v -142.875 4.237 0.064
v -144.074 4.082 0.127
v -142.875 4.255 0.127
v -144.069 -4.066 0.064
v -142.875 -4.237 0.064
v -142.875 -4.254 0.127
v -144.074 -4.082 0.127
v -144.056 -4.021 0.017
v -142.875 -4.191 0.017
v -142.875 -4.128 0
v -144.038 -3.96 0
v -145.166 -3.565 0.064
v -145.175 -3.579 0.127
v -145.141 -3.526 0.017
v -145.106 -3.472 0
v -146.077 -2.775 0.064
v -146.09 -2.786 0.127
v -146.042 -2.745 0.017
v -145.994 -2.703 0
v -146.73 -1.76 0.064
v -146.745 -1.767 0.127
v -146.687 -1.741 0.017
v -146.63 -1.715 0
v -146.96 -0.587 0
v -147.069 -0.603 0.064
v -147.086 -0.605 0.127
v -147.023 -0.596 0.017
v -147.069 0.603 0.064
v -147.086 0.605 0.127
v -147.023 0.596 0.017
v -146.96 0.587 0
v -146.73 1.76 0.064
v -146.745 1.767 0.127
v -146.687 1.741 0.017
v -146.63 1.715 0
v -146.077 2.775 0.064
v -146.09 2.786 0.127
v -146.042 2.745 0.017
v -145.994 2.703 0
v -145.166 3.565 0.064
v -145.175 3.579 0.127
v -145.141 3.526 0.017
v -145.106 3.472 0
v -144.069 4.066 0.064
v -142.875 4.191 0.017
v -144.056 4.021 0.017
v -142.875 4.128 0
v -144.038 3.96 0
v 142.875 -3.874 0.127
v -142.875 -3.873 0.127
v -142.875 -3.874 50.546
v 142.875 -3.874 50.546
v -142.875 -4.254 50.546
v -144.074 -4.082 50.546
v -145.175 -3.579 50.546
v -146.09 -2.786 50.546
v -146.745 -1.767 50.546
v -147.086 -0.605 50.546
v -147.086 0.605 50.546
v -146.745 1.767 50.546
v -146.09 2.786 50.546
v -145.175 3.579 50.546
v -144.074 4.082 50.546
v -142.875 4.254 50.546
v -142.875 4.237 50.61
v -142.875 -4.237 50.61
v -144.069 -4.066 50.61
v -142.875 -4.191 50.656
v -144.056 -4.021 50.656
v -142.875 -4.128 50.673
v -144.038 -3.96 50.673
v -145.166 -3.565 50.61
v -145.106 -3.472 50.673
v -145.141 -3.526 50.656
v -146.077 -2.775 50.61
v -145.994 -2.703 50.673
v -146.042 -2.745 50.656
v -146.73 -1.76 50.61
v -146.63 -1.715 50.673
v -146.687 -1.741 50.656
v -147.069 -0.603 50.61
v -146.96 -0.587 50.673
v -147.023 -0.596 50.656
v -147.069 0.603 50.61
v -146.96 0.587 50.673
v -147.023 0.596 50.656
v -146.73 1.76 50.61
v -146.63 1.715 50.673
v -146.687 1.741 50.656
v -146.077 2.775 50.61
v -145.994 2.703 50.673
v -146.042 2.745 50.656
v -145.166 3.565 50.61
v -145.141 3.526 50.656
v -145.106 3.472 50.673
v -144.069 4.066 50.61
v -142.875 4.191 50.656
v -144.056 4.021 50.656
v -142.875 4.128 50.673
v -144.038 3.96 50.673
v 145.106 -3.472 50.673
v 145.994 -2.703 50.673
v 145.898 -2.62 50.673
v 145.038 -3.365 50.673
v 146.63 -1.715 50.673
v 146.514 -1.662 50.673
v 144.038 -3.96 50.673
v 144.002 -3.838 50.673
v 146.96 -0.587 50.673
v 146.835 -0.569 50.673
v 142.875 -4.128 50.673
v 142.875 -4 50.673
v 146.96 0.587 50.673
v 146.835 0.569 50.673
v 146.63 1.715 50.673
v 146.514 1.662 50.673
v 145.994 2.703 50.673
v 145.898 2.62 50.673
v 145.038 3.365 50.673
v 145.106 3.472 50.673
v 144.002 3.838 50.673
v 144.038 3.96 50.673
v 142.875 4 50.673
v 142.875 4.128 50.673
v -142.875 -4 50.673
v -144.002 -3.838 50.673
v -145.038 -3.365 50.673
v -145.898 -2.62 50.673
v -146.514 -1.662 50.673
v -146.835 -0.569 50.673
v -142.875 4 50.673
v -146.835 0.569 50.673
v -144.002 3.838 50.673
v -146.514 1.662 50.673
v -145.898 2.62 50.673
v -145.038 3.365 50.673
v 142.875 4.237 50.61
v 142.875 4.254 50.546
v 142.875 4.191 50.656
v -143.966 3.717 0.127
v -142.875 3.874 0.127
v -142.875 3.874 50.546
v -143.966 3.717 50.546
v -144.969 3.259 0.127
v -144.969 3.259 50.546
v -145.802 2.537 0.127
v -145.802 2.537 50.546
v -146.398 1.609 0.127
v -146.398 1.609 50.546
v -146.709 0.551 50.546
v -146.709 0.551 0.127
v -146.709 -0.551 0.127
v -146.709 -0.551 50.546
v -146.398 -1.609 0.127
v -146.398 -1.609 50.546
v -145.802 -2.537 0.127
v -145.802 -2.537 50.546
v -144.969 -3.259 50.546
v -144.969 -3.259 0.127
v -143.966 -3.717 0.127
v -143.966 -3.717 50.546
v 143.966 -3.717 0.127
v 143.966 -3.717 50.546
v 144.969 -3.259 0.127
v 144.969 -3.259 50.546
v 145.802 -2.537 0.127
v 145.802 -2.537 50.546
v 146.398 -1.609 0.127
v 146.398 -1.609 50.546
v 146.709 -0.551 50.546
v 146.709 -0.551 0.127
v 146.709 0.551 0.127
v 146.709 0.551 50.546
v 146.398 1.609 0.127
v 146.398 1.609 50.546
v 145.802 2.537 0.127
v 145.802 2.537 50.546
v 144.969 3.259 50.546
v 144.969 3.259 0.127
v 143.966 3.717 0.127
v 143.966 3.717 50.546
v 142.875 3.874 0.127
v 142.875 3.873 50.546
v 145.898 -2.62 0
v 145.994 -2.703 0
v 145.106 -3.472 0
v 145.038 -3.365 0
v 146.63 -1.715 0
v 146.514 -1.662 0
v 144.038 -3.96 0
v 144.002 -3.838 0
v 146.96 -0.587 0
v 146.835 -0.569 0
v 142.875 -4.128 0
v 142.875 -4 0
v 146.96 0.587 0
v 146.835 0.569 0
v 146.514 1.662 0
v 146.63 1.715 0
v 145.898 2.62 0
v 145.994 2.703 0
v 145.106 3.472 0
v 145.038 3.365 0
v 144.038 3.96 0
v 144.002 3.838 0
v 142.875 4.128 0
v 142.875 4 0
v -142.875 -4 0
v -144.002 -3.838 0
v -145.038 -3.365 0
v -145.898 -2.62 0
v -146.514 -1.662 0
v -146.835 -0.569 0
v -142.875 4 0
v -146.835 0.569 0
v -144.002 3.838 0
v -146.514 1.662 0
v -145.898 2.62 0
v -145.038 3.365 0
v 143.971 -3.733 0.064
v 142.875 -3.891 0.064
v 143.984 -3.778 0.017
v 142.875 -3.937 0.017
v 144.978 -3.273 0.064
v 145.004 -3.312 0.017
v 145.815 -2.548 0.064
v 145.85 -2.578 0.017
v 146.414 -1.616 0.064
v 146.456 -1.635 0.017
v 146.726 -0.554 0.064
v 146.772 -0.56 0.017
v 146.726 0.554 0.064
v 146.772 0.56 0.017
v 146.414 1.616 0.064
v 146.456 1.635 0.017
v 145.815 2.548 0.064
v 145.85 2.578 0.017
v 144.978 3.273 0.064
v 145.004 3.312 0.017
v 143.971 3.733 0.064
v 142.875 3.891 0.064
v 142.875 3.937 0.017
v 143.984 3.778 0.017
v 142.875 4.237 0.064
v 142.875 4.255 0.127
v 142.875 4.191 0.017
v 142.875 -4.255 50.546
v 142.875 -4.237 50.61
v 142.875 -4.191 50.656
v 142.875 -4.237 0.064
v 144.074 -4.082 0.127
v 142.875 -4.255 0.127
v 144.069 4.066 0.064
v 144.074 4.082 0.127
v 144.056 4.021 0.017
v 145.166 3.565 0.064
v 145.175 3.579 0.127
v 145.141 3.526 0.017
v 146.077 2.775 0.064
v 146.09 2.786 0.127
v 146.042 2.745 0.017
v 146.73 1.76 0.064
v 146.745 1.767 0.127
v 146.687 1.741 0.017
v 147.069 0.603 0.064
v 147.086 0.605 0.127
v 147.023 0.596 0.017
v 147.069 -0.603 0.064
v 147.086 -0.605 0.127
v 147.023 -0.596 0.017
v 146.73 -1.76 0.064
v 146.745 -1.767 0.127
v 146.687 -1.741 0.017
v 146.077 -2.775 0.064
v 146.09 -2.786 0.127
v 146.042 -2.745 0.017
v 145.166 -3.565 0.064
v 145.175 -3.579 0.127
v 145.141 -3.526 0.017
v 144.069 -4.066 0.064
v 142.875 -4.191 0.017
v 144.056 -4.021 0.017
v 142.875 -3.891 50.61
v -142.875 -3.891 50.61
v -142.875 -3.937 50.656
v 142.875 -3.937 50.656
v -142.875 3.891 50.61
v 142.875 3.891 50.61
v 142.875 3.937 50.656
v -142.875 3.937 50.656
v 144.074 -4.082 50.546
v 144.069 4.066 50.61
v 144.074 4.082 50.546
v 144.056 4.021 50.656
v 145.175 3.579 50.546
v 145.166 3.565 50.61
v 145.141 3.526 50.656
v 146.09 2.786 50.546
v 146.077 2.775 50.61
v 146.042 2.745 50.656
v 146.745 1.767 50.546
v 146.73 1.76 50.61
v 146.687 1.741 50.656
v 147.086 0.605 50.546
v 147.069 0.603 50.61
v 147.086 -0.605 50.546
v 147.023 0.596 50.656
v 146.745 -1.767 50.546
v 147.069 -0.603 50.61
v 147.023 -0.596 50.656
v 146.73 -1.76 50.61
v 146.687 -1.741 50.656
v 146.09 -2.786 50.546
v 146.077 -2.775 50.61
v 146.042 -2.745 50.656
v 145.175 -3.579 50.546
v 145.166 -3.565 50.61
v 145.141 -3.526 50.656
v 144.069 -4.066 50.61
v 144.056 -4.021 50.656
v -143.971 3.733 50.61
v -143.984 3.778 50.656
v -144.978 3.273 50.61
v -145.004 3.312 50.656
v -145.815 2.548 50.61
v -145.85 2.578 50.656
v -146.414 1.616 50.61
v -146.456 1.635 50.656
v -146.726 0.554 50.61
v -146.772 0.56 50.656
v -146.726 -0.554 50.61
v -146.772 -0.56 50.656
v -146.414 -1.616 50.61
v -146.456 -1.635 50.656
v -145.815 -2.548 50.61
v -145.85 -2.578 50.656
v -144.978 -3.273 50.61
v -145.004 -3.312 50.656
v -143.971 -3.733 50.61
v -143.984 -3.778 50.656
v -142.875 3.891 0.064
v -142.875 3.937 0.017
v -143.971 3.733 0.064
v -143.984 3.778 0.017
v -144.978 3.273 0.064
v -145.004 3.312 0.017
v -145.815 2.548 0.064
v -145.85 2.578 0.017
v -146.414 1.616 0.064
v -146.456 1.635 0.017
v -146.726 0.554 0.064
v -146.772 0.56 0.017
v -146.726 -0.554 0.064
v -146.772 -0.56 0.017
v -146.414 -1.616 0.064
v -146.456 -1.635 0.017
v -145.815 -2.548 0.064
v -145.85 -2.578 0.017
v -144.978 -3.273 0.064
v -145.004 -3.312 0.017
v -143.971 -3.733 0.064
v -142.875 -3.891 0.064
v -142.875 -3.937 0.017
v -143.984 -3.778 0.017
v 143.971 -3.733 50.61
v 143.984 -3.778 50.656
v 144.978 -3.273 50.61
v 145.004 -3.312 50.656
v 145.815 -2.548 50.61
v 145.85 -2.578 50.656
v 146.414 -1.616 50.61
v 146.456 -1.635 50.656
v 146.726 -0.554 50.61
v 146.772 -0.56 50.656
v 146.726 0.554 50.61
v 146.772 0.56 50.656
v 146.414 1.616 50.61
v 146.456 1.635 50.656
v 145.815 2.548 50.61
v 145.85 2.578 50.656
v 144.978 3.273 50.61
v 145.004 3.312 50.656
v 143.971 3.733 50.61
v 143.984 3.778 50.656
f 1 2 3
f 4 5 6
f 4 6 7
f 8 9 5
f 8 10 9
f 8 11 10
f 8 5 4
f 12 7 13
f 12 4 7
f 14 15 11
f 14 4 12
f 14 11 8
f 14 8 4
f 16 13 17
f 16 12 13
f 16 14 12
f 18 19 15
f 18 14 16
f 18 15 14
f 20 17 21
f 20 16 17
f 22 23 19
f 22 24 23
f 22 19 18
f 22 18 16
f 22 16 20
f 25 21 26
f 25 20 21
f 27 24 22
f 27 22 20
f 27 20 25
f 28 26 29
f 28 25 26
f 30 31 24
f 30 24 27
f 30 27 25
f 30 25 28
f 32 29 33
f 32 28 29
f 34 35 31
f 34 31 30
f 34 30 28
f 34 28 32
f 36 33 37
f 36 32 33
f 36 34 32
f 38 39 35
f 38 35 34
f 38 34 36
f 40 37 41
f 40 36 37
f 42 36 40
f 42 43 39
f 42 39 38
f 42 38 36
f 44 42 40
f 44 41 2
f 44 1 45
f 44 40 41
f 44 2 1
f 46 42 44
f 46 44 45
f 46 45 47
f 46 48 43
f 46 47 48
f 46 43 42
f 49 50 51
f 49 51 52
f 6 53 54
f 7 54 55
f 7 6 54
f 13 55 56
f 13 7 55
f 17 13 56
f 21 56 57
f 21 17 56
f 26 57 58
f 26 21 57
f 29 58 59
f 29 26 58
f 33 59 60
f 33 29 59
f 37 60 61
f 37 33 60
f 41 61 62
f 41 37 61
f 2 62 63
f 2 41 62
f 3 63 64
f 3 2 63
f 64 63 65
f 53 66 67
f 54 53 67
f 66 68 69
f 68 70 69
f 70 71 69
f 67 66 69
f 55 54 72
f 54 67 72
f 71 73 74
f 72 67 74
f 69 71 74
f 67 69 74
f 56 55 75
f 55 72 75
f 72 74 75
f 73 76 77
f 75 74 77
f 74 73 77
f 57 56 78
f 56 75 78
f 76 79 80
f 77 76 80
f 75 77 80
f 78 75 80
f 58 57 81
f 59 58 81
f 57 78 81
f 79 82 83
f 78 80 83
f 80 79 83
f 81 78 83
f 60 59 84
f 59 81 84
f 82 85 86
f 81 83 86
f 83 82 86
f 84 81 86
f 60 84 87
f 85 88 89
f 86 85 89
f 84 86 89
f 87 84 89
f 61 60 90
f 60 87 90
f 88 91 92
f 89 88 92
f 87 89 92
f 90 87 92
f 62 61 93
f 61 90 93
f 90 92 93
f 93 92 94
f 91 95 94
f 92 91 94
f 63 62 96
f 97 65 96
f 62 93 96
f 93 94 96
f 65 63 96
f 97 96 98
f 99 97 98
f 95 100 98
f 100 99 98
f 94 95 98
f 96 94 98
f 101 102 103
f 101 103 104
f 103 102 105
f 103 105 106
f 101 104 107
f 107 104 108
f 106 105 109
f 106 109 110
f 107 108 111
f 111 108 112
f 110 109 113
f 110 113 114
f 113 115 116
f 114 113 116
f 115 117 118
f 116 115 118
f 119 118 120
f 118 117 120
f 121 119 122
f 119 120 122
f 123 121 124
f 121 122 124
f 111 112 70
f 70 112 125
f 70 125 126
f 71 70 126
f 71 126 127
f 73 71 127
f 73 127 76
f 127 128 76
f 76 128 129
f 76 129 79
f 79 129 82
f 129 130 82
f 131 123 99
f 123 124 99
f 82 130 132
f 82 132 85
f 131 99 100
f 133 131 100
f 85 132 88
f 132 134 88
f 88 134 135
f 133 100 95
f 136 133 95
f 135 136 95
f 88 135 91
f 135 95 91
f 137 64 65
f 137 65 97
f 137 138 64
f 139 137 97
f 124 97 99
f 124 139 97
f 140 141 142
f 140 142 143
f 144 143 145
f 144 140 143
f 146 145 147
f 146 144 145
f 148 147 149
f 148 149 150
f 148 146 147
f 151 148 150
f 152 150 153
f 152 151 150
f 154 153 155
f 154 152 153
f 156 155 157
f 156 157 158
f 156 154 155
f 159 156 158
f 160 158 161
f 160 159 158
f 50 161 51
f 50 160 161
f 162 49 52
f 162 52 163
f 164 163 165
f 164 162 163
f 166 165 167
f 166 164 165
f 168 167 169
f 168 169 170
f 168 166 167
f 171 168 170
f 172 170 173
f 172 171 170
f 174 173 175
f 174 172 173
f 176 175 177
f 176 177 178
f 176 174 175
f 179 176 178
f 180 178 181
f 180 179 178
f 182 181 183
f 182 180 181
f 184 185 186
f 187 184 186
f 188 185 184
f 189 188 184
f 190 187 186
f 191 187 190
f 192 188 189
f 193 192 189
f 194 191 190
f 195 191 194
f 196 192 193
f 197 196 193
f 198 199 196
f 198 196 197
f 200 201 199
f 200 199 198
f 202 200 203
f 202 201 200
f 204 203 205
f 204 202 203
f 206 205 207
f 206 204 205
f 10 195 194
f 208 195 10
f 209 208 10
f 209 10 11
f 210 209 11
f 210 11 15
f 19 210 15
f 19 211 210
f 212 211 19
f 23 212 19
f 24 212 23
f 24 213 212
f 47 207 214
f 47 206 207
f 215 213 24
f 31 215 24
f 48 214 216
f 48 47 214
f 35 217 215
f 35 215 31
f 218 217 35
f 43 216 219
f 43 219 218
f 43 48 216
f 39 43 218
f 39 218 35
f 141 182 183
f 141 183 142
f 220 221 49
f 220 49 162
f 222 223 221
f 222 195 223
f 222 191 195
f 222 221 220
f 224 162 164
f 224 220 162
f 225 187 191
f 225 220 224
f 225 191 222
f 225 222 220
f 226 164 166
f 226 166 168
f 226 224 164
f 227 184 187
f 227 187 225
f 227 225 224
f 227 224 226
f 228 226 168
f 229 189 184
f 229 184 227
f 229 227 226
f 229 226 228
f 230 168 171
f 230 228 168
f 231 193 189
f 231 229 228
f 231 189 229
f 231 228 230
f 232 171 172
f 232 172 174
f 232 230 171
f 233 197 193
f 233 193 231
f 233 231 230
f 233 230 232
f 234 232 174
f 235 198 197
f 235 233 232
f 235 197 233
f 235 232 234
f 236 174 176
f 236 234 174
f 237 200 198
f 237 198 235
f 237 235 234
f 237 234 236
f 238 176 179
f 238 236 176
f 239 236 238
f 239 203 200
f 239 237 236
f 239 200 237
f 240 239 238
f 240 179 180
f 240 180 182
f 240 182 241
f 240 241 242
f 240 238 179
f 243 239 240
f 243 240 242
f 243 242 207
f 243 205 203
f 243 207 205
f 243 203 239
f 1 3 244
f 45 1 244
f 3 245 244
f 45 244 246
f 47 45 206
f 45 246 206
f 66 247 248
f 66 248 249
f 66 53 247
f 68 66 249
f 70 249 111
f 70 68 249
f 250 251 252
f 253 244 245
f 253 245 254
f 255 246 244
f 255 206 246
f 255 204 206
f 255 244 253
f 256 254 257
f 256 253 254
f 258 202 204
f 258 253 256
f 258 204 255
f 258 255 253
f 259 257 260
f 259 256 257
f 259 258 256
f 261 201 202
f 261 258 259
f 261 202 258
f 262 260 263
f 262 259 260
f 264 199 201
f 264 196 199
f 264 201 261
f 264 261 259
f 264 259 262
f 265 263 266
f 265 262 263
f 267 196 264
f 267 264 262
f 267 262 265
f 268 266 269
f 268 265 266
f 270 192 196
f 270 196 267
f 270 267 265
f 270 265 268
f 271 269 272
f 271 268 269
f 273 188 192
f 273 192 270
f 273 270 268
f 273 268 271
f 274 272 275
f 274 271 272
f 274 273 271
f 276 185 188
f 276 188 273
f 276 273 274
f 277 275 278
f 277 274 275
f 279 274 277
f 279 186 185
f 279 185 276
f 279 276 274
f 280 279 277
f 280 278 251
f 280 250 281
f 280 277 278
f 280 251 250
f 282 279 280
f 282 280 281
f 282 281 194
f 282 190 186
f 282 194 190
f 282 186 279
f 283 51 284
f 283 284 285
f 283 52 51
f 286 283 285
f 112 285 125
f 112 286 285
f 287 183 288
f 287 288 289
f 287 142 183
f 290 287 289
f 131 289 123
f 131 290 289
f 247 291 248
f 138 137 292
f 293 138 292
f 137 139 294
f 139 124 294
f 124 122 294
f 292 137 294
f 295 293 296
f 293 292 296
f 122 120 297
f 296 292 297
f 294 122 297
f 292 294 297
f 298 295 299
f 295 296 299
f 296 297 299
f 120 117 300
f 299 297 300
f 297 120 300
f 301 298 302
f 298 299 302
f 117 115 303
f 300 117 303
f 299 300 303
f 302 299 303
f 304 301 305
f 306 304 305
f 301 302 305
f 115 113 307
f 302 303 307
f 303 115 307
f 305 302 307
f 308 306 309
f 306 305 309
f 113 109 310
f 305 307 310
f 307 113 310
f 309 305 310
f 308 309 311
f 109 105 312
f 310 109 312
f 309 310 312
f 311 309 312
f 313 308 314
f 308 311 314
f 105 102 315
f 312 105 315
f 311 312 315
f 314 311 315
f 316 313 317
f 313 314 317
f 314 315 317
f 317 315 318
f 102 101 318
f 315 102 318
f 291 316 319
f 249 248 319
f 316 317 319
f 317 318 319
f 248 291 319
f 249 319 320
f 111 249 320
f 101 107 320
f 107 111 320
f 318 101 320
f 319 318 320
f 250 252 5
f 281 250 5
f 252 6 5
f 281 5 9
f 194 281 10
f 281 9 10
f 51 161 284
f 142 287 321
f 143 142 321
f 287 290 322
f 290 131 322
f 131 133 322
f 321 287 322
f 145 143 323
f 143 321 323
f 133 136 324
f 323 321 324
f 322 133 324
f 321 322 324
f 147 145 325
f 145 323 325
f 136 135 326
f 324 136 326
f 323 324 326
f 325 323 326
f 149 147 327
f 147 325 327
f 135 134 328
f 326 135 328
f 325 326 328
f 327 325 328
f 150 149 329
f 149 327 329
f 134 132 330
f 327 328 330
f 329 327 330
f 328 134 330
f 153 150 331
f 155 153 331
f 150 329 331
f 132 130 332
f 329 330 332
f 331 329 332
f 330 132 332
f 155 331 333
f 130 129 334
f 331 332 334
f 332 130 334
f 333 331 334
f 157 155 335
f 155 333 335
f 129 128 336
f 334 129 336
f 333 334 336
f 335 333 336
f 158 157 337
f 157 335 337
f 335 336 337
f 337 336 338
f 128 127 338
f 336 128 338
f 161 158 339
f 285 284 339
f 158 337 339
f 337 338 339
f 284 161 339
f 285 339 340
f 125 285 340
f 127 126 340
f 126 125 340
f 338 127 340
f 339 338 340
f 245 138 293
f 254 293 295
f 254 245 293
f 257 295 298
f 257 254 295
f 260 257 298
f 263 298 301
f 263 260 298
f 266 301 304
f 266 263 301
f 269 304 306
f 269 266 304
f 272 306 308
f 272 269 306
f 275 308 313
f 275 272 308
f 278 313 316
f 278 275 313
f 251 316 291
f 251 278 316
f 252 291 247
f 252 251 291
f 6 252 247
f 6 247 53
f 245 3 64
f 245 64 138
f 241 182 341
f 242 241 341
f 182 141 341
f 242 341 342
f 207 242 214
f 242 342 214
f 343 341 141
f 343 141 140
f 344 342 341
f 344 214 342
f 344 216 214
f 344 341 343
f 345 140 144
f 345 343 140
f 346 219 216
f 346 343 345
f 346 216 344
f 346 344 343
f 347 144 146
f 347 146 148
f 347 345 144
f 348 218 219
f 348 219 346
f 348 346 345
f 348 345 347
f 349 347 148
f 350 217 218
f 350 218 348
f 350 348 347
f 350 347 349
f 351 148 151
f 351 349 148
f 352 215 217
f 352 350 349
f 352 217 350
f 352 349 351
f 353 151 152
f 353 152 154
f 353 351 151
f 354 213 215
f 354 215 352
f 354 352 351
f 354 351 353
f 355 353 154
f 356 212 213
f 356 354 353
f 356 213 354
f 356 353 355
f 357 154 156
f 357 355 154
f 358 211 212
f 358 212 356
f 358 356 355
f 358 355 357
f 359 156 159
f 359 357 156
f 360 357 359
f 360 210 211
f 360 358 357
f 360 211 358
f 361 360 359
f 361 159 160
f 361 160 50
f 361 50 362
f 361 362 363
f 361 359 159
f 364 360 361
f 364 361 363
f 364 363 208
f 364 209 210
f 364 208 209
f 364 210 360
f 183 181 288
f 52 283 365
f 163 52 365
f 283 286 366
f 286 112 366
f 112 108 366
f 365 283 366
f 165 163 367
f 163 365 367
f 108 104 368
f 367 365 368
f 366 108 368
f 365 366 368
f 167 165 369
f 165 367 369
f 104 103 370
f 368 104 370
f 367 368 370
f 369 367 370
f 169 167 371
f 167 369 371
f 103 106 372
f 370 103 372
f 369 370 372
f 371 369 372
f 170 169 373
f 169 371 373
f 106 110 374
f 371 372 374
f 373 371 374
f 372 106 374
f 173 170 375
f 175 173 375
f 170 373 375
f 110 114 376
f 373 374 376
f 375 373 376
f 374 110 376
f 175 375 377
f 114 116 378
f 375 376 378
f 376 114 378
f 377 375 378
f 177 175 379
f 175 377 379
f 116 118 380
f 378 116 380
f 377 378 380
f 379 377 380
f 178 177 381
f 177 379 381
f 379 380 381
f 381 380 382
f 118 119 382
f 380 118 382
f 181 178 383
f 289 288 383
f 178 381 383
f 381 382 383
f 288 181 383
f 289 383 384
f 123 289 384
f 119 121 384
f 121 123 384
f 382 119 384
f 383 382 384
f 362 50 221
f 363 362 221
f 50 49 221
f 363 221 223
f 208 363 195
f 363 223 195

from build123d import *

# Parameters (mm, degrees)
BOSS_EXTRUDE1_DEPTH = 50.673
FILLET1_R           = 0.127


with BuildPart() as part:
    # Sketch2 → Boss-Extrude1 (new body)
    with BuildSketch(Plane.XY):
        with BuildLine():
            Line((-142.875, 4.2545), (142.875, 4.2545))
            ThreePointArc((142.875, 4.2545), (147.1295, 0), (142.875, -4.2545))
            Line((142.875, -4.2545), (-142.875, -4.2545))
            ThreePointArc((-142.875, -4.2545), (-147.1295, 0), (-142.875, 4.2545))
        make_face()
        with BuildLine():
            ThreePointArc((142.875, -3.8735), (146.7485, 0), (142.875, 3.8735))
            Line((142.875, 3.8735), (-142.875, 3.8735))
            ThreePointArc((-142.875, 3.8735), (-146.7485, 0), (-142.875, -3.8735))
            Line((-142.875, -3.8735), (142.875, -3.8735))
        make_face(mode=Mode.SUBTRACT)
    extrude(amount=BOSS_EXTRUDE1_DEPTH)

    # Fillet1
    fillet1_edges = [part.edges().sort_by_distance(p)[0] for p in [
        (147.1295, 0, 0),
        (0, -4.2545, 0),
        (-147.1295, 0, 0),
        (0, 4.2545, 0),
        (0, -3.8735, 50.673),
        (0, 3.8735, 0),
        (-146.7485, 0, 0),
        (0, -3.8735, 0),
        (146.7485, 0, 0),
        (-146.7485, 0, 50.673),
        (0, 3.8735, 50.673),
        (0, 4.2545, 50.673),
        (-147.1295, 0, 50.673),
        (0, -4.2545, 50.673),
        (147.1295, 0, 50.673),
        (146.7485, 0, 50.673),
    ]]
    fillet(fillet1_edges, radius=FILLET1_R)


solid = part.part
